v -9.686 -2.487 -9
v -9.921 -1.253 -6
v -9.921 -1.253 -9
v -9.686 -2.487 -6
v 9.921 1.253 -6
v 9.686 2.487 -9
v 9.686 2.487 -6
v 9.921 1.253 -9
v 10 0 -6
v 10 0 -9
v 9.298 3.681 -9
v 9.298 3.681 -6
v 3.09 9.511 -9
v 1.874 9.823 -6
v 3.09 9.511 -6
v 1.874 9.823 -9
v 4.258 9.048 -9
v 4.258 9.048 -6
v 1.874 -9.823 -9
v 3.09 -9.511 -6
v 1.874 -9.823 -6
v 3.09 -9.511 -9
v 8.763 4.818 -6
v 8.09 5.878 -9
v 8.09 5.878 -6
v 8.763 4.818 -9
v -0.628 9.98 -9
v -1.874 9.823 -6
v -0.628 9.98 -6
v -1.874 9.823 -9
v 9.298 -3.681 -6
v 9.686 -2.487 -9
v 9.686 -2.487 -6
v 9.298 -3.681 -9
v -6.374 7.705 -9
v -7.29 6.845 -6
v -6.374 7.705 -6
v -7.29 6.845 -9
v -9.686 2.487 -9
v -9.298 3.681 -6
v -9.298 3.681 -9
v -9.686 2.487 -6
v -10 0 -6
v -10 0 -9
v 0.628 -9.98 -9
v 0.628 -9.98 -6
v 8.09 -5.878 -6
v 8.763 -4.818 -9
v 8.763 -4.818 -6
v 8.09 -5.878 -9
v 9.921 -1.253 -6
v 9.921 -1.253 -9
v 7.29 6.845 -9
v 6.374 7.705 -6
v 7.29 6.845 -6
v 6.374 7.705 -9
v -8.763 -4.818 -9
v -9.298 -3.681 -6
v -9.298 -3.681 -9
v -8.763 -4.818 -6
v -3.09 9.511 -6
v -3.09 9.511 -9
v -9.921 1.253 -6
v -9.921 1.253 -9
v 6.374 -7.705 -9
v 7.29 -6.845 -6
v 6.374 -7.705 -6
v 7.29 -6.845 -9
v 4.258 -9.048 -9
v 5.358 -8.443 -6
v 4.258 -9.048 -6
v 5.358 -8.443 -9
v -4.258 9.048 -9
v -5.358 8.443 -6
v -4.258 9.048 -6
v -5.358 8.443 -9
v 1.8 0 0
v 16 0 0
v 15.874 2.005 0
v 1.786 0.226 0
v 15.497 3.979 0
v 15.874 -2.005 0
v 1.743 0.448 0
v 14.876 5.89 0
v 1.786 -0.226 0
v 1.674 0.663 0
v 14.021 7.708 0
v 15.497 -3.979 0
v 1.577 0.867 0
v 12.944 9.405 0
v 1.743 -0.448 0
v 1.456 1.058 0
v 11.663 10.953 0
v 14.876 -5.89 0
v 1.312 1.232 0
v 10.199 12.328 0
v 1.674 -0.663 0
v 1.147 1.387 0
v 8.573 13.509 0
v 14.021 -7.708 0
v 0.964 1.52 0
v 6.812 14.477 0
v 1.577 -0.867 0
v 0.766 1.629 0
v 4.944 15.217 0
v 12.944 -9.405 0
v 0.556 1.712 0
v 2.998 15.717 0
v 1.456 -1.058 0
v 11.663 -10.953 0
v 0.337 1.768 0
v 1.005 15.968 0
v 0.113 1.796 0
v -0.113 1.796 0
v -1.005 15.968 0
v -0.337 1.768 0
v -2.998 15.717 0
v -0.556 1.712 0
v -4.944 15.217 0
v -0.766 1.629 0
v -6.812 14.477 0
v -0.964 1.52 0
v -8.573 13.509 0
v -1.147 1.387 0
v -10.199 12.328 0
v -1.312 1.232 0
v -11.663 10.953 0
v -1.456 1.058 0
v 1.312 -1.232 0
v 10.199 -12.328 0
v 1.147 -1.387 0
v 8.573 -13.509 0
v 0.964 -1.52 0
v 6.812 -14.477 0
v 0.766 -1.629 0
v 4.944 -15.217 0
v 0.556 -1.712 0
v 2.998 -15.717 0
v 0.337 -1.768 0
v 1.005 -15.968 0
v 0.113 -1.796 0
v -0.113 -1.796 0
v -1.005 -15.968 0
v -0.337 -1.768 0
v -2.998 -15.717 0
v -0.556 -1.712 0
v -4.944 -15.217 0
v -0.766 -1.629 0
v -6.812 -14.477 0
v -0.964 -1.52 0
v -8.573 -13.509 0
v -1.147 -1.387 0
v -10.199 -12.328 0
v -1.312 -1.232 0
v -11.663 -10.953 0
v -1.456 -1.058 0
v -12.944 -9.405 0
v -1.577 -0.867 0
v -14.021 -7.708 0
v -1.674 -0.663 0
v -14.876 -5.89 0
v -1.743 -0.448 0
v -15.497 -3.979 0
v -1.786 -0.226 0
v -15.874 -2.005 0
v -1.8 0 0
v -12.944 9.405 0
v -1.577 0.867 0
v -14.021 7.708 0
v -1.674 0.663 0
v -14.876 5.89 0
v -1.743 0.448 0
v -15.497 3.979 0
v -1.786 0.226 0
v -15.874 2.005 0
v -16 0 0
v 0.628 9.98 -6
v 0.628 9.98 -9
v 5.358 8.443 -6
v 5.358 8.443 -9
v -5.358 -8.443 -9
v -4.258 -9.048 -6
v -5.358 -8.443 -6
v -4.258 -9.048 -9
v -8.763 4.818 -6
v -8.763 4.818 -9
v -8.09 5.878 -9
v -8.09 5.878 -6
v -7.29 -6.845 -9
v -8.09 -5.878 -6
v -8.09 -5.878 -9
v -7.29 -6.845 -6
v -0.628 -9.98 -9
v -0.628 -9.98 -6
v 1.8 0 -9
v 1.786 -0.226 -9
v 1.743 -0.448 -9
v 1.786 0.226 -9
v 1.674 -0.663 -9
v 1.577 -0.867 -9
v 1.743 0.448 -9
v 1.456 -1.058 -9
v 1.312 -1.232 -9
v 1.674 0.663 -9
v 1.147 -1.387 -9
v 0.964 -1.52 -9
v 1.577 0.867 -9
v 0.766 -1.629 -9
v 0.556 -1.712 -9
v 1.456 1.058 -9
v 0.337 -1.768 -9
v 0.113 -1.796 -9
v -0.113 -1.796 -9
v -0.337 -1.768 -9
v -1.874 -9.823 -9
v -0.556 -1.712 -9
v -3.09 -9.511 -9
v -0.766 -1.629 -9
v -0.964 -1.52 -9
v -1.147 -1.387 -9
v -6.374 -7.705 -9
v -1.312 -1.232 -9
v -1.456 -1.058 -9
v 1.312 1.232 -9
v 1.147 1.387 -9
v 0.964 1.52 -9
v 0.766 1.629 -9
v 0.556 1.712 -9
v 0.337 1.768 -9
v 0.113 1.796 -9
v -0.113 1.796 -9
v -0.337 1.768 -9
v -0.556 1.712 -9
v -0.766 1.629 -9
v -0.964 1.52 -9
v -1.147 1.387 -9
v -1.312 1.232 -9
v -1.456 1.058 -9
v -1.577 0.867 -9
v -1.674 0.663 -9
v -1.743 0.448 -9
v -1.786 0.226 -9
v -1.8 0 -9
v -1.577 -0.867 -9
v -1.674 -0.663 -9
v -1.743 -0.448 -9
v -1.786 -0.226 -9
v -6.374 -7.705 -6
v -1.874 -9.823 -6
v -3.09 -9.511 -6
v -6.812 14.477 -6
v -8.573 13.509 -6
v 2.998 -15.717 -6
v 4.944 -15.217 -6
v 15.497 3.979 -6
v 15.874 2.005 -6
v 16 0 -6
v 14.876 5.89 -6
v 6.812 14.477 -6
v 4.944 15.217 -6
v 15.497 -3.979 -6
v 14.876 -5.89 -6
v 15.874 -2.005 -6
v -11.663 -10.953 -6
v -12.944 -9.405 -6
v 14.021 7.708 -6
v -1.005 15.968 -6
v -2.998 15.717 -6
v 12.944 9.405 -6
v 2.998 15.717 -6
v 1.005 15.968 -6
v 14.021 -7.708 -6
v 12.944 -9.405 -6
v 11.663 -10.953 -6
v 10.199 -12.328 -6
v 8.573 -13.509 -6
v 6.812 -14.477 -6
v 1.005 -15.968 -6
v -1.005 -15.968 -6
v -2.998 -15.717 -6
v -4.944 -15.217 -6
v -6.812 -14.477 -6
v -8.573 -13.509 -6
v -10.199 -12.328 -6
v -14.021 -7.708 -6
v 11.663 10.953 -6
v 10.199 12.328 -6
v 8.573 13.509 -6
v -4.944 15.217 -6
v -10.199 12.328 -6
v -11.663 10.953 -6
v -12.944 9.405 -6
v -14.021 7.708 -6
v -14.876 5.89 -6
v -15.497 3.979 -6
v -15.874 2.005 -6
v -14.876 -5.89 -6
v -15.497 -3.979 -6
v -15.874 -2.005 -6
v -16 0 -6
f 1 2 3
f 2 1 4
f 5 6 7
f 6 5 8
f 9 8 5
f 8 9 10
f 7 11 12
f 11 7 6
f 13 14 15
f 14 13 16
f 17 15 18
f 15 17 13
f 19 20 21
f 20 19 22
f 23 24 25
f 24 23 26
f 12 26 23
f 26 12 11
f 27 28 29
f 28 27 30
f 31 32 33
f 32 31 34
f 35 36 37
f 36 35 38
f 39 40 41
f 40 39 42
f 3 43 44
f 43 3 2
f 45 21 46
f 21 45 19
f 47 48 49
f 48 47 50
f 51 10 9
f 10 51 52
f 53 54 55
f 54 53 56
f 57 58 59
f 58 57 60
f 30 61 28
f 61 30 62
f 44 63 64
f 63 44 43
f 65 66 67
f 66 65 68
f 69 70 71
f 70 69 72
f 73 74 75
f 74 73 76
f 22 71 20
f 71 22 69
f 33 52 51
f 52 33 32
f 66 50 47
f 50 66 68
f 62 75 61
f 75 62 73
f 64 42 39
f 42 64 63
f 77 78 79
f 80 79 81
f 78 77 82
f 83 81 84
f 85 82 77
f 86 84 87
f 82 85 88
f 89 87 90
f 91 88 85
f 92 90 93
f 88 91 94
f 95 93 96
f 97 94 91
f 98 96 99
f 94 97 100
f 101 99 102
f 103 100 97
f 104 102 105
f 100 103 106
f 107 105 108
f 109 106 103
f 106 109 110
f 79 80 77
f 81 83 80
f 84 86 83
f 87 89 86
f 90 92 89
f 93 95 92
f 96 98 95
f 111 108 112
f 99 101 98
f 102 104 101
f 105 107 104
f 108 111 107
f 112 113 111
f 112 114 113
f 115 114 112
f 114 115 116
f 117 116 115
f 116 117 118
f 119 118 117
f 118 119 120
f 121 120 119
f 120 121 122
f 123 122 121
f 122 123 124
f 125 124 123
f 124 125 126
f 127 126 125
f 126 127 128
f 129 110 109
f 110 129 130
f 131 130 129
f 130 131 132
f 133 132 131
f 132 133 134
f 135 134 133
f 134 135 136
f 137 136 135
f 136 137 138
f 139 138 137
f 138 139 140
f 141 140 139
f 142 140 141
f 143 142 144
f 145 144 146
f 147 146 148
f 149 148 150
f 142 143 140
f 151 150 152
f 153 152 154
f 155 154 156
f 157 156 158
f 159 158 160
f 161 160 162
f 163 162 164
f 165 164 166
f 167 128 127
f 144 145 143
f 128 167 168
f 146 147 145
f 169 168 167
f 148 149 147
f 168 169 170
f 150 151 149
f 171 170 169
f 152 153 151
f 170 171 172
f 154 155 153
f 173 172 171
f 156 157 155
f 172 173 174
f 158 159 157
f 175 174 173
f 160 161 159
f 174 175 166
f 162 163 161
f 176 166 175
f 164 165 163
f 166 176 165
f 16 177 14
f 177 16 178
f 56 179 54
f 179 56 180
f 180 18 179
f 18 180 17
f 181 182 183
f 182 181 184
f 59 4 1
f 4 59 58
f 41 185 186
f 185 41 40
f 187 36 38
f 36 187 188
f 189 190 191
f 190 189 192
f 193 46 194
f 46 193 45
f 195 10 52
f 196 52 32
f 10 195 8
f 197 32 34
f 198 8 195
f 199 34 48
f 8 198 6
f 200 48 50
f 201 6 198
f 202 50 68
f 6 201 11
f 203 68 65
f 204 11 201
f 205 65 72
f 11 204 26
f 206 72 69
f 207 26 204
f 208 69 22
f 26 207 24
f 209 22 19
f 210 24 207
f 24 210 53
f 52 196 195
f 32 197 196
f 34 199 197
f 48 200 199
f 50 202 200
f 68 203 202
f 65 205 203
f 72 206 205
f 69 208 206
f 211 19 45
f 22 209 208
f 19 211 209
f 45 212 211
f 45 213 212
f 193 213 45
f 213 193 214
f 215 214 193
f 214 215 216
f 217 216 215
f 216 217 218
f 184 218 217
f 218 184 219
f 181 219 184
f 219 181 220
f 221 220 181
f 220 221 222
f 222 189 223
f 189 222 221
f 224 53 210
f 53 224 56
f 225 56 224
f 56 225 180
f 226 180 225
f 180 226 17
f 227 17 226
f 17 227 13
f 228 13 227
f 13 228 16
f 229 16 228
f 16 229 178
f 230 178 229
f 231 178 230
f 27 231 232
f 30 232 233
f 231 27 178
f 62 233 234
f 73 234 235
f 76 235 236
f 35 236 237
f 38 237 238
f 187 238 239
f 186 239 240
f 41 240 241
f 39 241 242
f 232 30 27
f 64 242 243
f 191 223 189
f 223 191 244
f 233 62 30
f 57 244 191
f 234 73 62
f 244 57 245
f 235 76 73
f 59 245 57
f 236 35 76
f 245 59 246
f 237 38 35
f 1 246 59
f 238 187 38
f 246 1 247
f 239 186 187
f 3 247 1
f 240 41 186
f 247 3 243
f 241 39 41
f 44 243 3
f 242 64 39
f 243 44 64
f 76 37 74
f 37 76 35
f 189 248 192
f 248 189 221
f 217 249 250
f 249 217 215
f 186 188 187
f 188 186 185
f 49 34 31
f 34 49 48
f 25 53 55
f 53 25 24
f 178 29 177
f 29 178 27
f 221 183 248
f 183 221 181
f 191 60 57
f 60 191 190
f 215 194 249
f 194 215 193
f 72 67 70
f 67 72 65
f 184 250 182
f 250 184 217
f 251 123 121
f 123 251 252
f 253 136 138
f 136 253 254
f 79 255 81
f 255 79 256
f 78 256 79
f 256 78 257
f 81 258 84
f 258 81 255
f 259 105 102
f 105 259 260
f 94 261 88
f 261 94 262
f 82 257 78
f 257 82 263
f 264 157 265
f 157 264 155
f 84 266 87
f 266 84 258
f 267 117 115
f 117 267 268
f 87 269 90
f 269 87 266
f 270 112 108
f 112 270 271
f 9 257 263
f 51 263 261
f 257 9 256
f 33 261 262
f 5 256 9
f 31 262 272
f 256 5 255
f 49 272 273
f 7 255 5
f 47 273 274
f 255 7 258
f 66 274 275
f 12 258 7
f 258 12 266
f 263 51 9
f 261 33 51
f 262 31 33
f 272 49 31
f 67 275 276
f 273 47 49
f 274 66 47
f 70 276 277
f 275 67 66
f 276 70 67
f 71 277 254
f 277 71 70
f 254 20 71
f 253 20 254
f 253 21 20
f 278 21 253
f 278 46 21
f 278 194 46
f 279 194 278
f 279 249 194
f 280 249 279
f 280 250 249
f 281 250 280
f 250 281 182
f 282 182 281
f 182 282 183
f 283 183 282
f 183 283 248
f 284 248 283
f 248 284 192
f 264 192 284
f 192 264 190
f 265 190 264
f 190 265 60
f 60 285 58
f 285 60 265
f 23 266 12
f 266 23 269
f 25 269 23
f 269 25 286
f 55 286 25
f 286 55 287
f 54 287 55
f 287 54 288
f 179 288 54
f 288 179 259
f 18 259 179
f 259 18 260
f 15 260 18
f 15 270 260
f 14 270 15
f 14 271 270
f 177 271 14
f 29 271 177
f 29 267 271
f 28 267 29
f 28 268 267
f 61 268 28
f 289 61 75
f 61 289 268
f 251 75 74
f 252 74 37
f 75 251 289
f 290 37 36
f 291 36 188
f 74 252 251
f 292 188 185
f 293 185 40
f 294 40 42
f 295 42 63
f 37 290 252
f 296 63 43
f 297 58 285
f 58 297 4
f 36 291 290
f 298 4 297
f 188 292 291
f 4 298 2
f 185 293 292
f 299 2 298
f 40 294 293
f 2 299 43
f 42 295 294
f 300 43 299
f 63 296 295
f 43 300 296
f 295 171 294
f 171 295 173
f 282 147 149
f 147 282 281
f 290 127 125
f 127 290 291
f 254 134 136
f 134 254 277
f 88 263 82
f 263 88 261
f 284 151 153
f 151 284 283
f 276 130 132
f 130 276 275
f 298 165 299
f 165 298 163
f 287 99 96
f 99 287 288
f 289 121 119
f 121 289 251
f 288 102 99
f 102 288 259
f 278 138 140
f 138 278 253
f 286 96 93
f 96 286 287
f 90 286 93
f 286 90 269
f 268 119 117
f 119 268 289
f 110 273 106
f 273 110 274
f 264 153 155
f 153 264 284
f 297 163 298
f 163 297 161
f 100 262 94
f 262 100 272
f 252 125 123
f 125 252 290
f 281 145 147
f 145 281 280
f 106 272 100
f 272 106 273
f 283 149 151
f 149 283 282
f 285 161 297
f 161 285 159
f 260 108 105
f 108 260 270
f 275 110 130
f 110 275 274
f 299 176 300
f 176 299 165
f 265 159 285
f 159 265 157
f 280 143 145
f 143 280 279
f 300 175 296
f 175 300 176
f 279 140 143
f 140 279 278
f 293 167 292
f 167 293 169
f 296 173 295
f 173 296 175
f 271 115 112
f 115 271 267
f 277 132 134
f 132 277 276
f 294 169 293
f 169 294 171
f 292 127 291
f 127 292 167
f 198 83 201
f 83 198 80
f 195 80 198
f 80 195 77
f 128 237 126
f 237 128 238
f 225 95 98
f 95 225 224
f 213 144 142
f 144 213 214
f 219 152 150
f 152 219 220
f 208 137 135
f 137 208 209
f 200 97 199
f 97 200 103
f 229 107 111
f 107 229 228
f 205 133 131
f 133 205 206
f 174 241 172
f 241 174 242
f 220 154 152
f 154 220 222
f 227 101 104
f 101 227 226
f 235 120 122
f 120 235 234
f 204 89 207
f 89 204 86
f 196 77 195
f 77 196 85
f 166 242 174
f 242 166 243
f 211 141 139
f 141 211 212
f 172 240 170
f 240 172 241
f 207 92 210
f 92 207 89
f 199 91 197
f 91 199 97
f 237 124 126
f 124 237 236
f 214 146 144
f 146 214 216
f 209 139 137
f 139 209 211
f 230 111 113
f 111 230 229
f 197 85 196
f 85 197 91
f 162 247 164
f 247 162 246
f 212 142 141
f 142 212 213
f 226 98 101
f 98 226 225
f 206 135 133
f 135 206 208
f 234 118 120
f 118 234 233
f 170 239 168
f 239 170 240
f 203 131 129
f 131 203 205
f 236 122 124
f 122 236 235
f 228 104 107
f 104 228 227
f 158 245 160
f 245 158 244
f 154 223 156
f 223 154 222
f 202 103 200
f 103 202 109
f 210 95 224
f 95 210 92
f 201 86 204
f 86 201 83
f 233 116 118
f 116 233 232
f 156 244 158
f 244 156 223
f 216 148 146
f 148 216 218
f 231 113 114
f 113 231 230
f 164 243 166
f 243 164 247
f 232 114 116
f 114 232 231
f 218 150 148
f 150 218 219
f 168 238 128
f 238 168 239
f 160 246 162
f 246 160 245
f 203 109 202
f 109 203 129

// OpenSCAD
$fn = 50;


difference() {
	union() {
		translate(v = [0, 0, -9.0000000000]) {
			cylinder(h = 9, r = 10.0000000000);
		}
		translate(v = [0, 0, -6.0000000000]) {
			cylinder(h = 6, r = 16.0000000000);
		}
	}
	union() {
		#translate(v = [0, 0, -9]) {
			cylinder(h = 9, r = 1.8000000000);
		}
	}
}
